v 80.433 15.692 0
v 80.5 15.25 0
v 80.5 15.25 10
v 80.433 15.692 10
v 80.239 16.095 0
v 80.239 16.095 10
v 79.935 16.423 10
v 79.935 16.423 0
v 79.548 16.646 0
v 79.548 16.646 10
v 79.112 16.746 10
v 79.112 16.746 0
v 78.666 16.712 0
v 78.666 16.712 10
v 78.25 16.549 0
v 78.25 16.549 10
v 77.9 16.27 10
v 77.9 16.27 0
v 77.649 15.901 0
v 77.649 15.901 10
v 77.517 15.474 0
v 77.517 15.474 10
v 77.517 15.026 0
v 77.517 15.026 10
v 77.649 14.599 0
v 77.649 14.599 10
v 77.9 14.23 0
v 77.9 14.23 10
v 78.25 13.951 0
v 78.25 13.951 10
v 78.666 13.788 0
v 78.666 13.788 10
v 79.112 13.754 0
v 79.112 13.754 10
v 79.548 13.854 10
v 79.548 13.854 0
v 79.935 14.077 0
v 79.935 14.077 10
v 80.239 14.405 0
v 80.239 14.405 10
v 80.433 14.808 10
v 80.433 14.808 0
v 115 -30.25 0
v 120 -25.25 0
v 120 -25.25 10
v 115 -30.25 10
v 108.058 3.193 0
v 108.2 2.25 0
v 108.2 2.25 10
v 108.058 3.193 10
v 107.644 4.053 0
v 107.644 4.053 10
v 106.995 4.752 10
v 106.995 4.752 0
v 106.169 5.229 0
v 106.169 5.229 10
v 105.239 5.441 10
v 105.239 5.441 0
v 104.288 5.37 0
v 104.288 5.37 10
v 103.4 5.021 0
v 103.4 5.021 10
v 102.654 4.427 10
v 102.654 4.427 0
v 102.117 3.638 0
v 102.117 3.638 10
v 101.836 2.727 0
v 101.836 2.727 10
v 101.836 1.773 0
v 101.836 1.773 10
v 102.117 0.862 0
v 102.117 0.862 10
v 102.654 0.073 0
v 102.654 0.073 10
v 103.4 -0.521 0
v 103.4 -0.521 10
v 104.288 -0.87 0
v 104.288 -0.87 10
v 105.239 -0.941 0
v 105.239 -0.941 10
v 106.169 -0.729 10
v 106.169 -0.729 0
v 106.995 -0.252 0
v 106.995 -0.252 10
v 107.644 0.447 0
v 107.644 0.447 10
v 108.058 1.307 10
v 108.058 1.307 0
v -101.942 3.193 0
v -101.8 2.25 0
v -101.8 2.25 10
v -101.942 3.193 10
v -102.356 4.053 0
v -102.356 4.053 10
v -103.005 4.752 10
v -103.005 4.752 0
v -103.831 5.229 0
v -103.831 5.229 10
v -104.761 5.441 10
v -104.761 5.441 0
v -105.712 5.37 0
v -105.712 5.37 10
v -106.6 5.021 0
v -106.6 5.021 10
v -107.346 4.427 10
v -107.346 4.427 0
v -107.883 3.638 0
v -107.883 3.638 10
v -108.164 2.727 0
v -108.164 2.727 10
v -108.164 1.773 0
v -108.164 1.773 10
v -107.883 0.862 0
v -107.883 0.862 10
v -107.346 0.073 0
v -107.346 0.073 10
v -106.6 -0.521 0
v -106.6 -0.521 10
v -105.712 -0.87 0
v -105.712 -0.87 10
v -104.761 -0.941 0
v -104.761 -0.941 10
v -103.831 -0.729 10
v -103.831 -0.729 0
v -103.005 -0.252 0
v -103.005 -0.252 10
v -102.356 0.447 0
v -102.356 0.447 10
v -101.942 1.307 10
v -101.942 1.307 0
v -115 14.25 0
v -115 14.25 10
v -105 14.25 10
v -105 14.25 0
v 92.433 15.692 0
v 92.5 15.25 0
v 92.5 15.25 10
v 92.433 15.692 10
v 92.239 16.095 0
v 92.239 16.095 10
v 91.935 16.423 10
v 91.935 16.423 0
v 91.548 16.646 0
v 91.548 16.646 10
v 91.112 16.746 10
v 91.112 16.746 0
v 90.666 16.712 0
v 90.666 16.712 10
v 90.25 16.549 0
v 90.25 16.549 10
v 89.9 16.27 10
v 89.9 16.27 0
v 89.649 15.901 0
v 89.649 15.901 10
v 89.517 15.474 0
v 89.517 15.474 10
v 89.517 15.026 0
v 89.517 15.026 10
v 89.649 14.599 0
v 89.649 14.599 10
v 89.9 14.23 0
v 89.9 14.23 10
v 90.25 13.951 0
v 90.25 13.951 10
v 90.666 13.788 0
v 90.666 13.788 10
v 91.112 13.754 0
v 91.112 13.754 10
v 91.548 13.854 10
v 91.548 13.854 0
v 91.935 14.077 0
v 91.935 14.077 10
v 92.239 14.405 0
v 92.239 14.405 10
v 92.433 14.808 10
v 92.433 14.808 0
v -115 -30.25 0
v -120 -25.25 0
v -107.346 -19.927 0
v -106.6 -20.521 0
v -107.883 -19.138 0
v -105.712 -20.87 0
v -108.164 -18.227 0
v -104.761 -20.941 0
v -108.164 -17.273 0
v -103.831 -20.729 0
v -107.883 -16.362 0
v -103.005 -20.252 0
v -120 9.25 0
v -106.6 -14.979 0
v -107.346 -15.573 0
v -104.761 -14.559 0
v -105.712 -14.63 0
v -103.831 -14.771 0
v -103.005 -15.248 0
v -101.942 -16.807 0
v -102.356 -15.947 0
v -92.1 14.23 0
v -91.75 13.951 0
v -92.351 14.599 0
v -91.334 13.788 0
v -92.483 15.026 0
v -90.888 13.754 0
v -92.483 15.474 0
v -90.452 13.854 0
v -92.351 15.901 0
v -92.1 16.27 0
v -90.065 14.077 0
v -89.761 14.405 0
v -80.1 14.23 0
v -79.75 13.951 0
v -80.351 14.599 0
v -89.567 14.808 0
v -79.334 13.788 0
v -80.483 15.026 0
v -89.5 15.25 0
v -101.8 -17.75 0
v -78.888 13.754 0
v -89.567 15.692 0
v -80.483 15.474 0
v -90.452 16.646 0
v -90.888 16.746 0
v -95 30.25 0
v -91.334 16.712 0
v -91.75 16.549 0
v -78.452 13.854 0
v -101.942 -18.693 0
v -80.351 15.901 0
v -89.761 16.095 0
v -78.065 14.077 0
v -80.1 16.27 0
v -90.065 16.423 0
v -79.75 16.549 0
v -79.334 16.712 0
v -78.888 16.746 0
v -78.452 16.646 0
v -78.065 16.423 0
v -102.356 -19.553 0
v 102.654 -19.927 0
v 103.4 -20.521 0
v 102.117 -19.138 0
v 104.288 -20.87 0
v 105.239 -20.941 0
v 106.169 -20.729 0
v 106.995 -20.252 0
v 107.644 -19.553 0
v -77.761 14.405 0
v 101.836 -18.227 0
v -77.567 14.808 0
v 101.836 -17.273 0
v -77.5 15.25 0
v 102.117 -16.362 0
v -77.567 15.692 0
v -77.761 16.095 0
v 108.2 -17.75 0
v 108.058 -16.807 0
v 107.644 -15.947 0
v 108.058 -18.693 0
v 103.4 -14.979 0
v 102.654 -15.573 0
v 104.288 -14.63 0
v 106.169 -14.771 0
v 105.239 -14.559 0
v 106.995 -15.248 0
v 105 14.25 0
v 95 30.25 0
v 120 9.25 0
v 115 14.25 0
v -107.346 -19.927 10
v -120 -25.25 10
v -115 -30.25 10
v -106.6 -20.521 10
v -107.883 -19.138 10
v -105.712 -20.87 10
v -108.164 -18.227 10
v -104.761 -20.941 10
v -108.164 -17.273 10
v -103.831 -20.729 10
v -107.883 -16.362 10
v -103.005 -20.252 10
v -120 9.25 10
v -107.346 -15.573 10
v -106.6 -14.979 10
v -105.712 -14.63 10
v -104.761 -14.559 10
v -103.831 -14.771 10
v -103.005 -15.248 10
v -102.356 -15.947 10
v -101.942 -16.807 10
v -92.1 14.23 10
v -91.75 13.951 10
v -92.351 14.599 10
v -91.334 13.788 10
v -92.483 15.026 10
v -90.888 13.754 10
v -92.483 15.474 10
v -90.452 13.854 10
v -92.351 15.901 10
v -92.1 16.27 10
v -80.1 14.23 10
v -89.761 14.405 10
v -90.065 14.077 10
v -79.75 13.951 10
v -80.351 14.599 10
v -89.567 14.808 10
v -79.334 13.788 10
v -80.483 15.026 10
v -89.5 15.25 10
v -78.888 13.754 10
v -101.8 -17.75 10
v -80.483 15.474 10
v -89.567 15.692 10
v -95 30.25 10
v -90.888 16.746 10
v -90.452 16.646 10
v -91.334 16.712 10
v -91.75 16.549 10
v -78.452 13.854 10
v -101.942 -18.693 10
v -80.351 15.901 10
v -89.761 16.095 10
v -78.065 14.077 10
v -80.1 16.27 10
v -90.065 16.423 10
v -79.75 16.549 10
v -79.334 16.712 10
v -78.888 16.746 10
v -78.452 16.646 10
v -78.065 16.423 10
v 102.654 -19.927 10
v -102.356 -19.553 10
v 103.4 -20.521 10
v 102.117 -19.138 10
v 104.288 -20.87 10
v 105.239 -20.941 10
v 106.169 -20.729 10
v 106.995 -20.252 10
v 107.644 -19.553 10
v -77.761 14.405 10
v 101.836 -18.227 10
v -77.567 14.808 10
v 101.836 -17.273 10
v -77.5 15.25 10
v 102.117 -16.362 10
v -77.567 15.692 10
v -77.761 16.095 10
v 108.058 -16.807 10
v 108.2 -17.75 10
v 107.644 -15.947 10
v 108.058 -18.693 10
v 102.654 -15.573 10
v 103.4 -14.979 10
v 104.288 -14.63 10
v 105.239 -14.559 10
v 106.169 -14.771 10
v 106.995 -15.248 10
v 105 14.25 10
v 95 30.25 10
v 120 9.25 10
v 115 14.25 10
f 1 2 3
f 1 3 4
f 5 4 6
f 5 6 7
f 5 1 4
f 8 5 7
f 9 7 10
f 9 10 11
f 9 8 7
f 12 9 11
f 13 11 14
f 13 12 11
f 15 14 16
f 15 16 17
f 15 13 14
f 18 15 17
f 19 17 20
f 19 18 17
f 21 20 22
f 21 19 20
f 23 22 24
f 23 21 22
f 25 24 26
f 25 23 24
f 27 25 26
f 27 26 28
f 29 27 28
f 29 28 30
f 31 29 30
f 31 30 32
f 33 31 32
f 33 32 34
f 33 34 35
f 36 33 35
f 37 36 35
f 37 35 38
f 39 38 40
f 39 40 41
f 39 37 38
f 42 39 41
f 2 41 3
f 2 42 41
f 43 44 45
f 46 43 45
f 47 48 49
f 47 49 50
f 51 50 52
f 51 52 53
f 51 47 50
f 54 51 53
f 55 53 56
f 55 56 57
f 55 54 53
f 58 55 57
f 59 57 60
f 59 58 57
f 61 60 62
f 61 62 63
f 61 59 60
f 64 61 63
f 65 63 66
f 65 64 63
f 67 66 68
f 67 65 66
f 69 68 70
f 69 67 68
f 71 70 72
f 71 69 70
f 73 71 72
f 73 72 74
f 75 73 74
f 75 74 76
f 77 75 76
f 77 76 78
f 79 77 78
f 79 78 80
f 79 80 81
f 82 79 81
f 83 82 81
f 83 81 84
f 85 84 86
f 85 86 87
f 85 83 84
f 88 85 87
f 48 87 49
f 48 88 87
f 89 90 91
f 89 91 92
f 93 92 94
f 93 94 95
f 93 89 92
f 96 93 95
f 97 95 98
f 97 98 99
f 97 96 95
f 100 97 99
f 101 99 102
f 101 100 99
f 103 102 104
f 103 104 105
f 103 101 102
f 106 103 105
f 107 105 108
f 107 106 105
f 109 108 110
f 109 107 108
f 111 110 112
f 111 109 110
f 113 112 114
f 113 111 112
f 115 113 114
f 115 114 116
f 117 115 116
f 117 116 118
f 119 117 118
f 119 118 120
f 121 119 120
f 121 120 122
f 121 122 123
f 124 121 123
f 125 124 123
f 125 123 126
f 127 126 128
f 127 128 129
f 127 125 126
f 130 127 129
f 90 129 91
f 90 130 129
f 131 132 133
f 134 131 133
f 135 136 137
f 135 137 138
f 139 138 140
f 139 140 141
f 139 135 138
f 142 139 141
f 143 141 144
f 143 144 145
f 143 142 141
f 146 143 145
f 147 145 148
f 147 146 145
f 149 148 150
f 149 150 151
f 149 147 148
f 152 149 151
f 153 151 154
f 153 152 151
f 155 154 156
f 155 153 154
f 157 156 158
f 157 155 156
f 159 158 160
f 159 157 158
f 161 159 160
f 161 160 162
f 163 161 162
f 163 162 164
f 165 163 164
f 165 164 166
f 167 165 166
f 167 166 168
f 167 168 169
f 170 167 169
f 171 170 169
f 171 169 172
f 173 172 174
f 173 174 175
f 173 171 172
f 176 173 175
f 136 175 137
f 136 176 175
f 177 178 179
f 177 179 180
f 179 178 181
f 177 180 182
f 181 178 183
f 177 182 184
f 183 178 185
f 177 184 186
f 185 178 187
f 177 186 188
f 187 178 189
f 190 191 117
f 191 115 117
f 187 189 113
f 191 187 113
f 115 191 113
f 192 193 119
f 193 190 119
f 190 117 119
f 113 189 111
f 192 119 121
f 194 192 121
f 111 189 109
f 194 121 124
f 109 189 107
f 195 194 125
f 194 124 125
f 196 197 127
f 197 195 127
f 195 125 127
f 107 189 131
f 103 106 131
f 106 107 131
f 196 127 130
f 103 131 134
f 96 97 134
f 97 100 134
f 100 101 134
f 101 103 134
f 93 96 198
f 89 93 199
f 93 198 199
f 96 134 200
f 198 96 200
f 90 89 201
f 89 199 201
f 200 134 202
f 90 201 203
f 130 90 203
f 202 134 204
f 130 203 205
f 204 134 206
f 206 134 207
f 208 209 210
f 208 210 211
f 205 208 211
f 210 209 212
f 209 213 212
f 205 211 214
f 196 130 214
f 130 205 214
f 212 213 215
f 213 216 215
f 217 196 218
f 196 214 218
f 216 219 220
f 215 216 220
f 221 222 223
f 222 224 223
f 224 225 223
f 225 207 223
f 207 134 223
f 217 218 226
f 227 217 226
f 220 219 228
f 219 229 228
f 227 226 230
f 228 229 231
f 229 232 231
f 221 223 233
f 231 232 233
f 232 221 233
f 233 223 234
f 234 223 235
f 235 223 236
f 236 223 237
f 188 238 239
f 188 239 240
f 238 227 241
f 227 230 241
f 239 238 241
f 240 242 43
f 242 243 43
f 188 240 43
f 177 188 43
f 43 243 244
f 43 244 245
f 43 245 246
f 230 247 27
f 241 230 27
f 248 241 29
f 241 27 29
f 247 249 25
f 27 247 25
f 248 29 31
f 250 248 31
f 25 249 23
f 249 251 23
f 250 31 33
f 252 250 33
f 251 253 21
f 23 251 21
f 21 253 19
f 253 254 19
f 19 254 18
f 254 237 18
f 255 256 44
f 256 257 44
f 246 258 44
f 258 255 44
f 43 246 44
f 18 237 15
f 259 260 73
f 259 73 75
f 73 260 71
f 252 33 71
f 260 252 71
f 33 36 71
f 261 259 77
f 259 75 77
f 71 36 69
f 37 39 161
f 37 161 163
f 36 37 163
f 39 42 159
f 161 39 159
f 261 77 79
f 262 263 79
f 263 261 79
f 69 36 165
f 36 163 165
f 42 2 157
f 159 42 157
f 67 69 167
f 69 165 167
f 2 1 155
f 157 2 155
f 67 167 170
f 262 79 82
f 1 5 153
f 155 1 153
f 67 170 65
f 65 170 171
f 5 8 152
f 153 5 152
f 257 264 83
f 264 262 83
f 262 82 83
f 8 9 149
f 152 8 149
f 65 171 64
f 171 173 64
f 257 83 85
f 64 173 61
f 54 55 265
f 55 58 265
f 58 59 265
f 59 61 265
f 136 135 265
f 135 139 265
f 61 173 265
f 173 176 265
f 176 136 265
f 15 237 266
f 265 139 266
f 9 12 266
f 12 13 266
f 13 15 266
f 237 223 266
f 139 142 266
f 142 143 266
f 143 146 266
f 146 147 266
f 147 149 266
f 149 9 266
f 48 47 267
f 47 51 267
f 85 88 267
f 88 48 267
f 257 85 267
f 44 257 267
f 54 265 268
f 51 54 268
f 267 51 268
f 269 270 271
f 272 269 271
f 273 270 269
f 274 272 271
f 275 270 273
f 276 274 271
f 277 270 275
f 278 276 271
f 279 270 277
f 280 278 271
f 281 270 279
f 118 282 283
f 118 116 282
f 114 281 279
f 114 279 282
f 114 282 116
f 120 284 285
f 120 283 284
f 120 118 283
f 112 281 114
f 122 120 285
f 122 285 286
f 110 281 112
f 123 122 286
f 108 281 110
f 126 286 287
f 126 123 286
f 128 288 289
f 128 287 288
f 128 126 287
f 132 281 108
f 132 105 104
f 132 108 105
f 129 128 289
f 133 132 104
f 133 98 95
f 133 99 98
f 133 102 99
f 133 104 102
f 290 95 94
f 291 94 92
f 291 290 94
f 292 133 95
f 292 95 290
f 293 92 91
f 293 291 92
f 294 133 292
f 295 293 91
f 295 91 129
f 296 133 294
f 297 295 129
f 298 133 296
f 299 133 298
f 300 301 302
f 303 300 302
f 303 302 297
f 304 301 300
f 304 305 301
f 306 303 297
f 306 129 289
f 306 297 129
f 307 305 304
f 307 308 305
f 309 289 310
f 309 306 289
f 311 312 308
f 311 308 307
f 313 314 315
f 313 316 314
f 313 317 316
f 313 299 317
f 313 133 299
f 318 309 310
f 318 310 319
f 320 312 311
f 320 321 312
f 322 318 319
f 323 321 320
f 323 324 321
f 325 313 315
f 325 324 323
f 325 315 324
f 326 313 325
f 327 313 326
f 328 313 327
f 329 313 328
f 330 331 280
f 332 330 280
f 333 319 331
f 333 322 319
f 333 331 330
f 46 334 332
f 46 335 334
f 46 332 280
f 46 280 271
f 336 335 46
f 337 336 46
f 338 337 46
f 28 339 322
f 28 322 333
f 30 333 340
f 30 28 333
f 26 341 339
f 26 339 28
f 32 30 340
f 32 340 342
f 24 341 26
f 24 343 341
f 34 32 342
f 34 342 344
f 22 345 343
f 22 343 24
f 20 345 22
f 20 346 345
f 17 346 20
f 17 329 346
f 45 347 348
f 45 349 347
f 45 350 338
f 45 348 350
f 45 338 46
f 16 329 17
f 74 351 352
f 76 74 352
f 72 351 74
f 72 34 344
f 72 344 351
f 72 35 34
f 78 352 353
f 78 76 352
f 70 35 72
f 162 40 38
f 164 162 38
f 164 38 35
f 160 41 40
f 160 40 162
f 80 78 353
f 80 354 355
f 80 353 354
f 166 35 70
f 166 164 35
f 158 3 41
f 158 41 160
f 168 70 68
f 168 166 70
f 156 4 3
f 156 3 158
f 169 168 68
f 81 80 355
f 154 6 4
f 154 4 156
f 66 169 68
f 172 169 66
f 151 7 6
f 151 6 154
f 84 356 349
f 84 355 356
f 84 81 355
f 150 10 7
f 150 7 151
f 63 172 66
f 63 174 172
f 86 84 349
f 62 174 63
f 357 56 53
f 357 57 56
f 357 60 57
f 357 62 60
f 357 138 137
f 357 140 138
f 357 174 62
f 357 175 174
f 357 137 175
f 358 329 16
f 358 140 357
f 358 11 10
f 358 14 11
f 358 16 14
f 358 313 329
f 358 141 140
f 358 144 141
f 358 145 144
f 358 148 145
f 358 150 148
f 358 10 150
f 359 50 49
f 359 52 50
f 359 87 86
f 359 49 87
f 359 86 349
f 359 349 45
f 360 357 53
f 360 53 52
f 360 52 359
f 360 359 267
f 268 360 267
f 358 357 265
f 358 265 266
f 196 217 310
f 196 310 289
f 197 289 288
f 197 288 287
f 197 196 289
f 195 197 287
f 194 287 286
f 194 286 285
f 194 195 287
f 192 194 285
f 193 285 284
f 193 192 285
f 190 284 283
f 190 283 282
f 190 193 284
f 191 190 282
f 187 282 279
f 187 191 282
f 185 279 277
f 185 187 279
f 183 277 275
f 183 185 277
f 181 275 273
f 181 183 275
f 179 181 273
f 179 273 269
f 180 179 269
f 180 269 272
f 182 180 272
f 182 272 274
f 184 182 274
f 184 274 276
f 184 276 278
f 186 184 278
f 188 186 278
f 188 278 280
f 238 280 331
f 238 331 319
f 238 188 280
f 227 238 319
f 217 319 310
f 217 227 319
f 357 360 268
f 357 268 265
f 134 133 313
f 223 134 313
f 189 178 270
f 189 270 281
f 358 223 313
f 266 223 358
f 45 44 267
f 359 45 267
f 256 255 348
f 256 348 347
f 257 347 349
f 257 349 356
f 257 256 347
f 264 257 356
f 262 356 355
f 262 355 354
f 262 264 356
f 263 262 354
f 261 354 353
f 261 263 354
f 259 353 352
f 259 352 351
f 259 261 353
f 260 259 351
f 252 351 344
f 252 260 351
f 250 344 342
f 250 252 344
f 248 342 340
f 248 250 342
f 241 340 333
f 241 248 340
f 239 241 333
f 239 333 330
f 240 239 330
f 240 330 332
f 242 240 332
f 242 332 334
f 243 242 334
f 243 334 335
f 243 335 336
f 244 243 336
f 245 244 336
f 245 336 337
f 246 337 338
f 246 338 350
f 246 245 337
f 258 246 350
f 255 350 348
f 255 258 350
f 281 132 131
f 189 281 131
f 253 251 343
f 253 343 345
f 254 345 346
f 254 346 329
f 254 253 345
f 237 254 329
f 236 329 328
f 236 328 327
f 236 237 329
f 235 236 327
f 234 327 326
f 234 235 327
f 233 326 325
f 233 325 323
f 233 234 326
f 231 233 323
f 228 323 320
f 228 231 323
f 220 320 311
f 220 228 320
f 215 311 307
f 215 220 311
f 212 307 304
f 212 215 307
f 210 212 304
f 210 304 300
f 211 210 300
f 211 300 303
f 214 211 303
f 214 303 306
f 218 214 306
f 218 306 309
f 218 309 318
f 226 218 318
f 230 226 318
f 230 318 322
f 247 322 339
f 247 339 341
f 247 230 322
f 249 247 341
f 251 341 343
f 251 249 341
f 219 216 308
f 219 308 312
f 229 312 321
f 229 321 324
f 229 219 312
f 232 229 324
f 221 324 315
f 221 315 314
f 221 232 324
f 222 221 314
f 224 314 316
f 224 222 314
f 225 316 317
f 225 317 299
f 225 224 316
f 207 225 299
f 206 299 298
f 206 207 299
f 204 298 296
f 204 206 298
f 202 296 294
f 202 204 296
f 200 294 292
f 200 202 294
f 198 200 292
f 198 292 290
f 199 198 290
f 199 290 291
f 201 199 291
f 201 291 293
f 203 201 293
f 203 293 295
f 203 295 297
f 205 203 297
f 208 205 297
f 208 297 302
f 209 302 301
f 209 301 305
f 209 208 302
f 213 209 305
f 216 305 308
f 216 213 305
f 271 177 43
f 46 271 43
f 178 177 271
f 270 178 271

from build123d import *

# Parameters (mm, degrees)
SKETCH1_W           = 240
SKETCH1_H           = 60.5
SKETCH1_R           = 3.2
SKETCH1_R_2         = 1.5
BOSS_EXTRUDE1_DEPTH = 10
CUT_EXTRUDE1_DEPTH  = 11
CHAMFER3_SIZE       = 5


with BuildPart() as part:
    # Sketch1 → Boss-Extrude1 (new body)
    with BuildSketch(Plane.XY):
        Rectangle(SKETCH1_W, SKETCH1_H)
        with Locations((-105, 2.25)):
            Circle(SKETCH1_R, mode=Mode.SUBTRACT)
        with Locations((-105, -17.75)):
            Circle(SKETCH1_R, mode=Mode.SUBTRACT)
        with Locations((105, -17.75)):
            Circle(SKETCH1_R, mode=Mode.SUBTRACT)
        with Locations((105, 2.25)):
            Circle(SKETCH1_R, mode=Mode.SUBTRACT)
        with Locations((-91, 15.25)):
            Circle(SKETCH1_R_2, mode=Mode.SUBTRACT)
        with Locations((-79, 15.25)):
            Circle(SKETCH1_R_2, mode=Mode.SUBTRACT)
        with Locations((79, 15.25)):
            Circle(SKETCH1_R_2, mode=Mode.SUBTRACT)
        with Locations((91, 15.25)):
            Circle(SKETCH1_R_2, mode=Mode.SUBTRACT)
    extrude(amount=BOSS_EXTRUDE1_DEPTH)

    # Sketch2 → Cut-Extrude1 (cut, through all)
    with BuildSketch(Plane.XY.offset(10)):
        Polygon((-120, 14.25), (-105, 14.25), (-95, 30.25), (-120, 30.25), align=None)
        Polygon((120, 30.25), (120, 14.25), (105, 14.25), (95, 30.25), align=None)
    extrude(amount=-CUT_EXTRUDE1_DEPTH, mode=Mode.SUBTRACT)

    # Chamfer3
    chamfer3_edges = [part.edges().sort_by_distance(p)[0] for p in [
        (-120, 14.25, 5),
        (120, 14.25, 5),
        (120, -30.25, 5),
        (-120, -30.25, 5),
    ]]
    chamfer(chamfer3_edges, length=CHAMFER3_SIZE)


solid = part.part
